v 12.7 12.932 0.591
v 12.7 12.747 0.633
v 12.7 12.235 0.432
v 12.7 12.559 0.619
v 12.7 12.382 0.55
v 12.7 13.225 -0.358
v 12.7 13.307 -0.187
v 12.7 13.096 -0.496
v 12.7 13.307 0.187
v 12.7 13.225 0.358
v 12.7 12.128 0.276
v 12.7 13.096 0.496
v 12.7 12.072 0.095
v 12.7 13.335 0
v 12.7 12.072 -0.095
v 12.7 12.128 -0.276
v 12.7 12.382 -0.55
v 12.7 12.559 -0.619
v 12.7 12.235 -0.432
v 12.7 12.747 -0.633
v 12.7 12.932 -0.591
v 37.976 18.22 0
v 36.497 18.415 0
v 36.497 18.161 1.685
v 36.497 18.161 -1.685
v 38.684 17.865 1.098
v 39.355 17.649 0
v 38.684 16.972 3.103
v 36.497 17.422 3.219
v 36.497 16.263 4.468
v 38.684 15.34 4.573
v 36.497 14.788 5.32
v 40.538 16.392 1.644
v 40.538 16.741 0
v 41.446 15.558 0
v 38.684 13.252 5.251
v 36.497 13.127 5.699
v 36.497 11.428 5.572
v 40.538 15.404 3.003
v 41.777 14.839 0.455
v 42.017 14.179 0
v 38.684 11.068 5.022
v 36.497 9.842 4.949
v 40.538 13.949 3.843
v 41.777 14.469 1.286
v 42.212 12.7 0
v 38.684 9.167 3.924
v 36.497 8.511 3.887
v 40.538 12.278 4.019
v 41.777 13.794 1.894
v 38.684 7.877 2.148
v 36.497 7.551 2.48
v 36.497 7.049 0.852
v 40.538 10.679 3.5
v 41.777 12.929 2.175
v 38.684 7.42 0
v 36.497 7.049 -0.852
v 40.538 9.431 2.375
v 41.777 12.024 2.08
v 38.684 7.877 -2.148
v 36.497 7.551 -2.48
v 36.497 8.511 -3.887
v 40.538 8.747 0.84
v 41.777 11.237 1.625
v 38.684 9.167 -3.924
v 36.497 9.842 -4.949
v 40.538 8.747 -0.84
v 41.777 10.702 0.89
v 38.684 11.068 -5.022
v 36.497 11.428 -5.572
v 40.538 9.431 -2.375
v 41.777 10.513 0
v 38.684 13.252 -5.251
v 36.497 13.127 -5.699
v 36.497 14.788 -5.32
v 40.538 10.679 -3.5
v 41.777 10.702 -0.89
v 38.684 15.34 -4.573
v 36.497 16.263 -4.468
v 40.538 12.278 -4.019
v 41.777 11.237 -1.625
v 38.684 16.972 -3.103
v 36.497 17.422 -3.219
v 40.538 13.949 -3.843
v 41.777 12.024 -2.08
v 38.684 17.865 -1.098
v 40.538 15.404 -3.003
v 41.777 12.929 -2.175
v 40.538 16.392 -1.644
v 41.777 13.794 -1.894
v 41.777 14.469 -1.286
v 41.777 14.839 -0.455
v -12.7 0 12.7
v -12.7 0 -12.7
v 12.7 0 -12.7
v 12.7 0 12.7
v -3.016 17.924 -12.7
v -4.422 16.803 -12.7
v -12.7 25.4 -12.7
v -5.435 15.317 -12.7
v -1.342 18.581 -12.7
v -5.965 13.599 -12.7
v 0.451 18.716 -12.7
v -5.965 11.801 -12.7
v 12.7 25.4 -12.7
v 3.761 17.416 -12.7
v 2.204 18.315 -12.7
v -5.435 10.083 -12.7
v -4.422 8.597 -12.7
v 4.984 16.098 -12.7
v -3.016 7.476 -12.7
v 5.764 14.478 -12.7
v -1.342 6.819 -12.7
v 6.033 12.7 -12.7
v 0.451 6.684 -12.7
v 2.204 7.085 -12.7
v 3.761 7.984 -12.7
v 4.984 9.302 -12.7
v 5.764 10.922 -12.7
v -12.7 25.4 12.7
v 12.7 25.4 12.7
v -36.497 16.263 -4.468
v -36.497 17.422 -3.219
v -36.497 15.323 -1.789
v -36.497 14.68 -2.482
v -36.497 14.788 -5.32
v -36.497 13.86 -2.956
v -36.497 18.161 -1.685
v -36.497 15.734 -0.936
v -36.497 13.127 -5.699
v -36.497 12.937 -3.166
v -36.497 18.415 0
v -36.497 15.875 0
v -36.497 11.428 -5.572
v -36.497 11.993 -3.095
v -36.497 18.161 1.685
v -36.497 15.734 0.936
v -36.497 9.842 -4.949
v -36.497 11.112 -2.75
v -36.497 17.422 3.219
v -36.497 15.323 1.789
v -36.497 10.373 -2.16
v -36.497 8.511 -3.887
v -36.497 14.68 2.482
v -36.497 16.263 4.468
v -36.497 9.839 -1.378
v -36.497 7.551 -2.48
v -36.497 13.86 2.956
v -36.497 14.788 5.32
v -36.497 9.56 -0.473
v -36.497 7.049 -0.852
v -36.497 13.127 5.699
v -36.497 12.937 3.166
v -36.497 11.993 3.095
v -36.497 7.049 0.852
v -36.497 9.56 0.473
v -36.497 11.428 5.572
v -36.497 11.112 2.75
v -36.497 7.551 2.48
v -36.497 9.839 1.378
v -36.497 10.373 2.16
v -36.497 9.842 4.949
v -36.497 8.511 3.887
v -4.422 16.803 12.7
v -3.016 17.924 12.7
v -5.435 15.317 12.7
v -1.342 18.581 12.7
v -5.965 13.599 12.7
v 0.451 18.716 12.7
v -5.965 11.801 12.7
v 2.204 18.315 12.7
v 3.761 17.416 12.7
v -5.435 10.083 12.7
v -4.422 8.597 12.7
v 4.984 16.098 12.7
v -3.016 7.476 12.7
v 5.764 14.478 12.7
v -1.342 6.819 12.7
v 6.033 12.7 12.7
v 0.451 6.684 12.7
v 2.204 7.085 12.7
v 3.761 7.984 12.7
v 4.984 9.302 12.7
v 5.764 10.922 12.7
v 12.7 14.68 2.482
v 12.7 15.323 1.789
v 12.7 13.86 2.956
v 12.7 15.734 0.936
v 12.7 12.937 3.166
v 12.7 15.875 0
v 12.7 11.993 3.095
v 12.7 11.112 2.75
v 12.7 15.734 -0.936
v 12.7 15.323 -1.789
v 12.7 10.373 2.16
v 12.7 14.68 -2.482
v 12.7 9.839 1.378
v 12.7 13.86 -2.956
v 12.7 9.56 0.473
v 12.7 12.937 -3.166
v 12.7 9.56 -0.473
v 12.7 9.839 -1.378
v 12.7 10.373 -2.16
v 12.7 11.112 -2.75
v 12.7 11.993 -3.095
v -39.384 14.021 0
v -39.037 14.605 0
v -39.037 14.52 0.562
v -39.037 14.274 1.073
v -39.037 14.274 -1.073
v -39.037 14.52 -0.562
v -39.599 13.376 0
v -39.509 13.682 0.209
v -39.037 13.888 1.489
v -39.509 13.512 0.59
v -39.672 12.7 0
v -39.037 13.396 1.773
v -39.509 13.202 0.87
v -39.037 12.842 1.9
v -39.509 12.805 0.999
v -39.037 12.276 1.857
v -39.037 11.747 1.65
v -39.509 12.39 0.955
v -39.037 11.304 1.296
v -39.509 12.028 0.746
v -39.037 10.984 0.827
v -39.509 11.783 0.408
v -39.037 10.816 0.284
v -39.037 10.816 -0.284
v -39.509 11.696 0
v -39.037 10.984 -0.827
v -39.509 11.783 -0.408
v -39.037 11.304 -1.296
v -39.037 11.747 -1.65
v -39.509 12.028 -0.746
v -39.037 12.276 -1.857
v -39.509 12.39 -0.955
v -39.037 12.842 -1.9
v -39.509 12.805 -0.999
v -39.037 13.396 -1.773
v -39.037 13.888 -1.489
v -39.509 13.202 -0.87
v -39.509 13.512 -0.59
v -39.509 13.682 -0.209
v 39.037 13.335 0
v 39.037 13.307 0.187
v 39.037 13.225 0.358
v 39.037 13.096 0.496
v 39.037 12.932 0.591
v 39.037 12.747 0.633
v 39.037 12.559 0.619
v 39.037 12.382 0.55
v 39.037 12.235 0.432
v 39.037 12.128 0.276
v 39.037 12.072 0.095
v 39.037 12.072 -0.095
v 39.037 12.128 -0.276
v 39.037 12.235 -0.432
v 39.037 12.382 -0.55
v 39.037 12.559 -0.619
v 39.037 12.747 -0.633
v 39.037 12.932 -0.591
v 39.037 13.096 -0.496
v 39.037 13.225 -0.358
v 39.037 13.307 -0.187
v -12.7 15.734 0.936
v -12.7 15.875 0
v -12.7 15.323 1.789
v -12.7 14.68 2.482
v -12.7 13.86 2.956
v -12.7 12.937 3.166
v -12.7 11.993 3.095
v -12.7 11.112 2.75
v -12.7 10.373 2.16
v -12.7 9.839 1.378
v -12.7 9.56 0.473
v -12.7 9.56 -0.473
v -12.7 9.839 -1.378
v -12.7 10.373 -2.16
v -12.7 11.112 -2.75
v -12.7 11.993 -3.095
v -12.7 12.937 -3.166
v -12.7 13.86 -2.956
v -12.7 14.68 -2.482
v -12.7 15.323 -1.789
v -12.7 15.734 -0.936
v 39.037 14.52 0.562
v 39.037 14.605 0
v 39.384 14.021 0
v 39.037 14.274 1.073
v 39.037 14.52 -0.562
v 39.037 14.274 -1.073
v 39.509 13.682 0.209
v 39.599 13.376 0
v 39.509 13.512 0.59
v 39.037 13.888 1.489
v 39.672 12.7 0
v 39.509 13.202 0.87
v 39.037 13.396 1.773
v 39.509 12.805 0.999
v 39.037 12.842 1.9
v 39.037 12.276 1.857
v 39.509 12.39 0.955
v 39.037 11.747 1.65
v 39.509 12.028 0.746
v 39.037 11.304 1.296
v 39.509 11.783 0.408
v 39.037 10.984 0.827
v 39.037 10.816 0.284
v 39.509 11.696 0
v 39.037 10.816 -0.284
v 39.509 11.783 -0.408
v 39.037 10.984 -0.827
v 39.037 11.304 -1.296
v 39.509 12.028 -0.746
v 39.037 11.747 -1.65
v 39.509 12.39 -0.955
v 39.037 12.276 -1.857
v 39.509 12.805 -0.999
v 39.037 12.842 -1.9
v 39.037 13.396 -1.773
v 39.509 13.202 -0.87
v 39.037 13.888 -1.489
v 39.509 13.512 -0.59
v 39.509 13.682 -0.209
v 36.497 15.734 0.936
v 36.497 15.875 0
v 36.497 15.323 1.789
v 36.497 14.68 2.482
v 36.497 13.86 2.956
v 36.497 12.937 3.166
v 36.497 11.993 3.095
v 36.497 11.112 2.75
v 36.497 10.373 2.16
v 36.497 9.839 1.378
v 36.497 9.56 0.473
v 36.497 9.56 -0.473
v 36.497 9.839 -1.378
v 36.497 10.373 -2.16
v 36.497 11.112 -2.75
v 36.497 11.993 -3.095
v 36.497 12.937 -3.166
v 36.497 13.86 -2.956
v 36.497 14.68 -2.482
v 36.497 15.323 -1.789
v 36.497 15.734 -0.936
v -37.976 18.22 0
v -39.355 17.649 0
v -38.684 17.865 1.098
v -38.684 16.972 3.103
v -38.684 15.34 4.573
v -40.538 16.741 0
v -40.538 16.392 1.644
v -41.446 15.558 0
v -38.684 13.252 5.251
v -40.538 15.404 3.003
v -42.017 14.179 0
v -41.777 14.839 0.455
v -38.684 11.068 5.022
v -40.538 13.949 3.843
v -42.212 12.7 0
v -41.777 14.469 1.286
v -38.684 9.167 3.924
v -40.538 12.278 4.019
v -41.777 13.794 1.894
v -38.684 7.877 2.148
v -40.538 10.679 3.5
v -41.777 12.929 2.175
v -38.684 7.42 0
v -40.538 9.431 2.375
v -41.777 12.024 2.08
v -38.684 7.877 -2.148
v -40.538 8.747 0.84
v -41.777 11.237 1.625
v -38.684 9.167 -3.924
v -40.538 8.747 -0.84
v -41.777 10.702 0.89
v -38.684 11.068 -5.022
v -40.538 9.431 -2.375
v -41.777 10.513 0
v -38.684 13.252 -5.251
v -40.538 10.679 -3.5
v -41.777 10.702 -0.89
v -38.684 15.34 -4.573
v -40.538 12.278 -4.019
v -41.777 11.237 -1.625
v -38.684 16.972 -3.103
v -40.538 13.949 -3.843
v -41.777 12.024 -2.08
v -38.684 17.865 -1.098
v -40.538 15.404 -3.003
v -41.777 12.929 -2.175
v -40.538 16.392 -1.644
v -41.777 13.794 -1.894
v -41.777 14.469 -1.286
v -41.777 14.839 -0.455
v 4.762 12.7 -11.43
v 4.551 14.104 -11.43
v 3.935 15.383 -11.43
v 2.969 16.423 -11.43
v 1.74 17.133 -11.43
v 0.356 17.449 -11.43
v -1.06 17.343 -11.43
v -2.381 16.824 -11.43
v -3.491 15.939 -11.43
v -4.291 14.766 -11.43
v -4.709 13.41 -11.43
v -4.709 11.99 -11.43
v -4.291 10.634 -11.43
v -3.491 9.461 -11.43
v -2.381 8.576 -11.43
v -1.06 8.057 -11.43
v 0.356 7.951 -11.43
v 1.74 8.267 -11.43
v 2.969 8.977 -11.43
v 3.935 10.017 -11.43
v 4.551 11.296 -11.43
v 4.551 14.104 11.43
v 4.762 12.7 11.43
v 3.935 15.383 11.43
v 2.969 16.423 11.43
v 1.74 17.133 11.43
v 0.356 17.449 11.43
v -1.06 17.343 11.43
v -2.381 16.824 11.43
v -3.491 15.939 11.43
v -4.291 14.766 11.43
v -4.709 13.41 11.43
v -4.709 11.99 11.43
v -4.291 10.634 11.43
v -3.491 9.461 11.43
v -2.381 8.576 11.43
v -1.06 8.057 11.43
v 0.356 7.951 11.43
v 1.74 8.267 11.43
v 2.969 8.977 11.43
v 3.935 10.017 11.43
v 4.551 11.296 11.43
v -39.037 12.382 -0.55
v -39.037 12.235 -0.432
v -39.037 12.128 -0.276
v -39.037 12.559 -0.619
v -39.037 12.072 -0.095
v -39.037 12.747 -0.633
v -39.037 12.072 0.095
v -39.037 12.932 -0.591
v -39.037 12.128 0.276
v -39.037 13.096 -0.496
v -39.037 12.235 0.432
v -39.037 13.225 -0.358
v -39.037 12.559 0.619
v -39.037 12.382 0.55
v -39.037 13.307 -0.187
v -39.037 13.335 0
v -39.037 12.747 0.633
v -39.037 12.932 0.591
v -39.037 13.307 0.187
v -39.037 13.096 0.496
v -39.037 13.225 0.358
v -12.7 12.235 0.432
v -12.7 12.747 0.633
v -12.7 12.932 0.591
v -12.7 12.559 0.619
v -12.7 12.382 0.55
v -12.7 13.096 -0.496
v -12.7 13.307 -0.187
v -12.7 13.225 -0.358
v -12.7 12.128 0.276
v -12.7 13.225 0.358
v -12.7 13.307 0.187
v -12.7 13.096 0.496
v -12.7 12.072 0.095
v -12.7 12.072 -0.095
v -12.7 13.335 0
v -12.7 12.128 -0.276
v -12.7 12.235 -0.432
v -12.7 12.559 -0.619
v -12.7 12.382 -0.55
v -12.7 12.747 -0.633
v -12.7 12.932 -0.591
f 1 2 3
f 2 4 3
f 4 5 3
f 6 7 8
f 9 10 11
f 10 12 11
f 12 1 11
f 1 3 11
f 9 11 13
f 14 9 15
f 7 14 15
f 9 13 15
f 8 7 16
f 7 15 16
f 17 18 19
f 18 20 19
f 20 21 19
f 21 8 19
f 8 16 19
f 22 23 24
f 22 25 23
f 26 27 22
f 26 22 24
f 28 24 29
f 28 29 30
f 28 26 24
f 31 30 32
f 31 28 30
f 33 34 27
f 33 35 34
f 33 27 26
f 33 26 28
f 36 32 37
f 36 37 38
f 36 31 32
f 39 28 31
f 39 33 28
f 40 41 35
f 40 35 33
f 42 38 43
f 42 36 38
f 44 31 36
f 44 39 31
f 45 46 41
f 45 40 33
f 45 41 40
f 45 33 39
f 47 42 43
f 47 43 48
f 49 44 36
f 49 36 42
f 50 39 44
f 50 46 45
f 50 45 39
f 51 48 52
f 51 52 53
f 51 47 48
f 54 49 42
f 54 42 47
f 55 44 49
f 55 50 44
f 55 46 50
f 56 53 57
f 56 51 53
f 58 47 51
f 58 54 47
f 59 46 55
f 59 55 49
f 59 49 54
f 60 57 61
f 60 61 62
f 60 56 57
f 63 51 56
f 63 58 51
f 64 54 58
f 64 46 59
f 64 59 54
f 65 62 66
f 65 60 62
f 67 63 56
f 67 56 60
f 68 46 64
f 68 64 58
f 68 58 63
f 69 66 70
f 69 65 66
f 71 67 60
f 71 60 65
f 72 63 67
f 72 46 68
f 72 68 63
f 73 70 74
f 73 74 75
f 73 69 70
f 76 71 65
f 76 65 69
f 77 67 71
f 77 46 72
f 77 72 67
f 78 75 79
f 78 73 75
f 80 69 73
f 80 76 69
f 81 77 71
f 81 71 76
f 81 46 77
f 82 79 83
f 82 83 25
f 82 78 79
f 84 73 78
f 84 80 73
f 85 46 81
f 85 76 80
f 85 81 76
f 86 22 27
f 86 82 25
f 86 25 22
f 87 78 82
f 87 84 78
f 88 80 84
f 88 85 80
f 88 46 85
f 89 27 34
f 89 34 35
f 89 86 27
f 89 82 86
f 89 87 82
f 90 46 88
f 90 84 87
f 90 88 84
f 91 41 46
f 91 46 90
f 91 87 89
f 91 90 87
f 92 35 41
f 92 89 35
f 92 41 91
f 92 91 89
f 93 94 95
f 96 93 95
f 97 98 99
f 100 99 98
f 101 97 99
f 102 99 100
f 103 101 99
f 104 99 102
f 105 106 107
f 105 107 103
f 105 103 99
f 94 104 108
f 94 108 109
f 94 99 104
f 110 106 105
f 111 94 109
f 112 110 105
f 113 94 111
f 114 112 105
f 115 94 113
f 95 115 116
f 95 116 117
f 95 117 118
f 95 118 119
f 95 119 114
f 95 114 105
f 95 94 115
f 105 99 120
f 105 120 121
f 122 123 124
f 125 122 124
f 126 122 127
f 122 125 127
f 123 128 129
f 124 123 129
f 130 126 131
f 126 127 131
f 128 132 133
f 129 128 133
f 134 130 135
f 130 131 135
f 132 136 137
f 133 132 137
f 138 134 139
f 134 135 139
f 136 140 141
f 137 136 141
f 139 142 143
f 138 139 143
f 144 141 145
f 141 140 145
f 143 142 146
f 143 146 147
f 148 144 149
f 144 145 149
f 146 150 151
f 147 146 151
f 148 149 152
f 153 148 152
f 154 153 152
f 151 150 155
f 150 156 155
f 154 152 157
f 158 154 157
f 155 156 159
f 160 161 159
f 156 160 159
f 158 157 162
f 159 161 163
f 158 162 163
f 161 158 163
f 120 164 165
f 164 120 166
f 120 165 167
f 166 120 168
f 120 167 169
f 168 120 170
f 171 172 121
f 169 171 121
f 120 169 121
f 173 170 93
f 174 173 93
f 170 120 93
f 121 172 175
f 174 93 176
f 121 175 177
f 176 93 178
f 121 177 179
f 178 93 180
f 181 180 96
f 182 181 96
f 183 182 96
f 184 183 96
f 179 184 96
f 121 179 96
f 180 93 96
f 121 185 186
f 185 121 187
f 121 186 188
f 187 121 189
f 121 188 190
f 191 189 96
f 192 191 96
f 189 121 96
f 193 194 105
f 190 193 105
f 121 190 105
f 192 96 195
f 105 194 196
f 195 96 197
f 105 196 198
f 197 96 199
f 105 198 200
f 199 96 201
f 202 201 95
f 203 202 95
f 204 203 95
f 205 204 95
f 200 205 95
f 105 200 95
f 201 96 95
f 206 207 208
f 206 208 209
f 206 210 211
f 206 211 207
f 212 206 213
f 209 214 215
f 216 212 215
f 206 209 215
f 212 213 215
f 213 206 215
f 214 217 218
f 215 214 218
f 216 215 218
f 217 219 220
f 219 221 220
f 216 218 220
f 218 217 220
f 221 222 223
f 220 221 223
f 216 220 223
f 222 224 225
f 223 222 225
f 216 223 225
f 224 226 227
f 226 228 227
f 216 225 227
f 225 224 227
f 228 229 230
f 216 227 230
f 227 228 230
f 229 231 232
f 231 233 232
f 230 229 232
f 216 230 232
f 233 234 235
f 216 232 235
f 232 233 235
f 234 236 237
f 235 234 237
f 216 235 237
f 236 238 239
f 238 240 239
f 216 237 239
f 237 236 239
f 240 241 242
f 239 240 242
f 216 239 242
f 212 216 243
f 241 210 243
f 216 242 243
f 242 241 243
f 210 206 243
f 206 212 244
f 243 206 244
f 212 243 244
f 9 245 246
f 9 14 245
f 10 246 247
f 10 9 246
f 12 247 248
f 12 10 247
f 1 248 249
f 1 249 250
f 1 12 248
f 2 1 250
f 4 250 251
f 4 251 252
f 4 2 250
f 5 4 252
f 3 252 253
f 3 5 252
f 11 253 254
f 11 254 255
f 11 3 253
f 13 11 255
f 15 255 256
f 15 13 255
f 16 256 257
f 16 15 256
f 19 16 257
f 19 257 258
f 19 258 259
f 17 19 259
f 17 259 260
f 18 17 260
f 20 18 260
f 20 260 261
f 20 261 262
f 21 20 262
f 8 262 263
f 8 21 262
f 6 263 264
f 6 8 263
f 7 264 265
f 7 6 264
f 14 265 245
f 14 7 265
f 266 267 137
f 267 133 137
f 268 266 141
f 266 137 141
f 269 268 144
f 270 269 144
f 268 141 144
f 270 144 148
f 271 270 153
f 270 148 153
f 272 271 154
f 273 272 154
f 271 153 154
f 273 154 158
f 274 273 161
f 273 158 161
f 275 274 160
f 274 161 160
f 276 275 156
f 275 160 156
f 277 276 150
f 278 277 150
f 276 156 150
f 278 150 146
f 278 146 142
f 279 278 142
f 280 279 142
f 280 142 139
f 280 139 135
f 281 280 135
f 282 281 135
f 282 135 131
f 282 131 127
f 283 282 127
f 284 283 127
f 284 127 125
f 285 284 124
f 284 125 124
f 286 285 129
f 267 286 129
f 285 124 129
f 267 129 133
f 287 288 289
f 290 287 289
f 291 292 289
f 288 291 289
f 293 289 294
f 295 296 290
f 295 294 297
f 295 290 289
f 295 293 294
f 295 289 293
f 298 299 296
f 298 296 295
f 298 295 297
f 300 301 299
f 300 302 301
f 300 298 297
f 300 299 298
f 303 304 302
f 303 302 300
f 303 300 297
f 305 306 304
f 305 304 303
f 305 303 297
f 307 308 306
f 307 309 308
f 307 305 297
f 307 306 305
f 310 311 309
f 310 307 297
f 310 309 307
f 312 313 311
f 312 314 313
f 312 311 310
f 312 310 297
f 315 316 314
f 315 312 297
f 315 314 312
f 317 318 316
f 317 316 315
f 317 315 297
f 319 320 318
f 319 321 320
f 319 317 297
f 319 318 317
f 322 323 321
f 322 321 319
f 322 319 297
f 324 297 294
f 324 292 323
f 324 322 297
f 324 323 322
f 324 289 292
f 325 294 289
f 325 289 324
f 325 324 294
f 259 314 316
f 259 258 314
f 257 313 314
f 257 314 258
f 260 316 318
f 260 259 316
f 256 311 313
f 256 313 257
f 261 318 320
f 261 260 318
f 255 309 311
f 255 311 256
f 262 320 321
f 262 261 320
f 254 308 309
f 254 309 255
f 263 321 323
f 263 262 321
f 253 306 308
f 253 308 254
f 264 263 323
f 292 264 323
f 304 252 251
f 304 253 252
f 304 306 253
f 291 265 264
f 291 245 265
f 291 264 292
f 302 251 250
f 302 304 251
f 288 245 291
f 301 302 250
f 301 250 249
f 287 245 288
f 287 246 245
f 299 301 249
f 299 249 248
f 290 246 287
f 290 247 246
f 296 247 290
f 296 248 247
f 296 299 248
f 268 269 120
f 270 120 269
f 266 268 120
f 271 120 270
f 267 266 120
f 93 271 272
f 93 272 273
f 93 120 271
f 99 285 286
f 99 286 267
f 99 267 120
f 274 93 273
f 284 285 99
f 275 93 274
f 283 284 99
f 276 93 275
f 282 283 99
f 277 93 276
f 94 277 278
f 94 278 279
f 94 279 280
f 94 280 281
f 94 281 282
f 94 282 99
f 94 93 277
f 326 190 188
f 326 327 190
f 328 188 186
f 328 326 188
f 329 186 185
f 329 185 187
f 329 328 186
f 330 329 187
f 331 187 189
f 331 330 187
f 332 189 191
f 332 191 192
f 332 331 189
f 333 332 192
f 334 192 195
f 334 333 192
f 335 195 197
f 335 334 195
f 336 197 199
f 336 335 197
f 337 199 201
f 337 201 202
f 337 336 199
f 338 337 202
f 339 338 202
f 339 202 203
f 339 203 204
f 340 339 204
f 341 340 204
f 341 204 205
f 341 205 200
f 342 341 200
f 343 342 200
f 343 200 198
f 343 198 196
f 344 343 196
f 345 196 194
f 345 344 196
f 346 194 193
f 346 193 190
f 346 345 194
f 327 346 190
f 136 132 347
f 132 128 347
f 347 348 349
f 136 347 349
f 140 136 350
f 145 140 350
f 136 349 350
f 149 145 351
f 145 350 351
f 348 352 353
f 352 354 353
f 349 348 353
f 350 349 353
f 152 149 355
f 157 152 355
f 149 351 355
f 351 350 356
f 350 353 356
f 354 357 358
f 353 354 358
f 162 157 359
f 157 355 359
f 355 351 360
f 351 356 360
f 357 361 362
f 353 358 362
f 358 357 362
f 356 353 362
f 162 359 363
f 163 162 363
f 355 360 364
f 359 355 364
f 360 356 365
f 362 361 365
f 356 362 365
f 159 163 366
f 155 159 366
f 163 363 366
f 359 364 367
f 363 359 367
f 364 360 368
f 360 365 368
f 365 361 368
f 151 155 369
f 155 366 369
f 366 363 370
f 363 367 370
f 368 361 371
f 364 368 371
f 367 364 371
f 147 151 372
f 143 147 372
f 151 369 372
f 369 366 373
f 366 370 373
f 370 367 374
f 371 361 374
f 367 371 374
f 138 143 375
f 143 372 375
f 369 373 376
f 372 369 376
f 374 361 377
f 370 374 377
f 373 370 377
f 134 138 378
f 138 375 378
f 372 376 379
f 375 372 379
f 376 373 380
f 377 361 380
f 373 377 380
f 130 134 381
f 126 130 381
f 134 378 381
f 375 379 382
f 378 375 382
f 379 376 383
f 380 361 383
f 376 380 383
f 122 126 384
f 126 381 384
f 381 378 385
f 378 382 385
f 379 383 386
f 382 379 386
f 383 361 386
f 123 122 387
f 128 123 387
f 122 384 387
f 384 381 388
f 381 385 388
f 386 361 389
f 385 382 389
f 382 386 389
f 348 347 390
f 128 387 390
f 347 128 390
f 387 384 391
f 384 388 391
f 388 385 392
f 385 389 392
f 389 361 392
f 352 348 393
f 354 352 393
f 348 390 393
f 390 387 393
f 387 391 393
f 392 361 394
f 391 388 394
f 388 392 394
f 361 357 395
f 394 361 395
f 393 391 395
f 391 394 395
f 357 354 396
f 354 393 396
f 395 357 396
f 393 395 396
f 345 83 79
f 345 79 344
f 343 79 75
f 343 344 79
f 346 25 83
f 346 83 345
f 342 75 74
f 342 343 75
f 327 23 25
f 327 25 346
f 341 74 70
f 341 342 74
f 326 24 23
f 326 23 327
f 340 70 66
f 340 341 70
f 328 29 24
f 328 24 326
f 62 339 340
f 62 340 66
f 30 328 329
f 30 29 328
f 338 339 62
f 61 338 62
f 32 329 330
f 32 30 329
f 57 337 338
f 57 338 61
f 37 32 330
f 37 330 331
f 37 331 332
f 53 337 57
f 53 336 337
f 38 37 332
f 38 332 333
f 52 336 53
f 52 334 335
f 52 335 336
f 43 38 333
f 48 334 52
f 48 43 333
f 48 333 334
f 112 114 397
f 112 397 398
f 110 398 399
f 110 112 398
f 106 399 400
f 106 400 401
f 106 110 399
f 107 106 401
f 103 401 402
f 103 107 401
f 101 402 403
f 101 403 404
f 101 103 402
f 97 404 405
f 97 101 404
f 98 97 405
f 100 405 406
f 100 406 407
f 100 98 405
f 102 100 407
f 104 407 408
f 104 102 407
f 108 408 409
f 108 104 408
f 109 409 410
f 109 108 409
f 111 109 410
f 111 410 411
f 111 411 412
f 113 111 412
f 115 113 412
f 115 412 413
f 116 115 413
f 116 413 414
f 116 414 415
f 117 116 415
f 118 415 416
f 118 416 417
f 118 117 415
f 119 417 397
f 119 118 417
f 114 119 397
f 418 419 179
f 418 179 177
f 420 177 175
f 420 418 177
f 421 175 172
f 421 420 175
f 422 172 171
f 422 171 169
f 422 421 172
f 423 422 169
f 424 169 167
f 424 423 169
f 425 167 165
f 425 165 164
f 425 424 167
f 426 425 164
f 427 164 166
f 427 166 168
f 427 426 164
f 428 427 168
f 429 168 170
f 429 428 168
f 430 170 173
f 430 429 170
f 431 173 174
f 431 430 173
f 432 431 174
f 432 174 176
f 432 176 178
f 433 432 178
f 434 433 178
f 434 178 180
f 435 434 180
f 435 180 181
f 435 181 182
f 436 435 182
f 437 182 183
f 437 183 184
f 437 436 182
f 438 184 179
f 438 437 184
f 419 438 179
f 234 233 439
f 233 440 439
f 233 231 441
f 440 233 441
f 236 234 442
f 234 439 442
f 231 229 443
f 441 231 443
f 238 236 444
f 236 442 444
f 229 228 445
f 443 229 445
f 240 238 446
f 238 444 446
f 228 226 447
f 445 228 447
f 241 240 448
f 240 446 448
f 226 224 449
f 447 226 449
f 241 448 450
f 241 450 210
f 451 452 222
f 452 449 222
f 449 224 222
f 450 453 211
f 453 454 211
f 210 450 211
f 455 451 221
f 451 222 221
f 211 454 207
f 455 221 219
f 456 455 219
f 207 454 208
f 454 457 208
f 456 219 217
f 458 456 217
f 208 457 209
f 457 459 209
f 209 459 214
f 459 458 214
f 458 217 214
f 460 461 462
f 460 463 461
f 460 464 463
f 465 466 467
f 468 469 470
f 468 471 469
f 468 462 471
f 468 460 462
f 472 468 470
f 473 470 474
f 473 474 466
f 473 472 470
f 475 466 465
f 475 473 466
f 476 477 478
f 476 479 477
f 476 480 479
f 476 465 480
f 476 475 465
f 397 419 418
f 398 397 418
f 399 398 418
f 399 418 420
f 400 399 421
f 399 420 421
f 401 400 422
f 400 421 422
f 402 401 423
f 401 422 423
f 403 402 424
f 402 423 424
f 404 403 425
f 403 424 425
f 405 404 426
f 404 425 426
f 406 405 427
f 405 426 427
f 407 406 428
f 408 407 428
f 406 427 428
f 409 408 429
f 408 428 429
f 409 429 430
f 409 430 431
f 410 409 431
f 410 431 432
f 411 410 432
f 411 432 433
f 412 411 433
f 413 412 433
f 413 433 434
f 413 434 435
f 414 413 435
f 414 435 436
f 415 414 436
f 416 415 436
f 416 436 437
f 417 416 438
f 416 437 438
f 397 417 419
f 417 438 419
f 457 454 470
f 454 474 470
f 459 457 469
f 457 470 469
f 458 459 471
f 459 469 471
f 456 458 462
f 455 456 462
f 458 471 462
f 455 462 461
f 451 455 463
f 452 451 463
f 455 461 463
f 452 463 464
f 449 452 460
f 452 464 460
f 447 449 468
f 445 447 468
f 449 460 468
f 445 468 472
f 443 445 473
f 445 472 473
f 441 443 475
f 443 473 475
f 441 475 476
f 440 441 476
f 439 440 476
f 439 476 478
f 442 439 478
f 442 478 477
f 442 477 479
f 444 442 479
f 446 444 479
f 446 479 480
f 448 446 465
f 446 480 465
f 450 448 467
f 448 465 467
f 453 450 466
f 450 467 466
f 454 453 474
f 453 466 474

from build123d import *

# Parameters (mm, degrees)
SKETCH1_W           = 25.4
SKETCH1_H           = 25.4
BOSS_EXTRUDE1_DEPTH = 25.4
SKETCH2_R           = 4.7625
CUT_EXTRUDE1_DEPTH  = 25.4
CHAMFER1_SIZE       = 1.27
CHAMFER2_SIZE       = 1.27


with BuildPart() as part:
    # Sketch1 → Boss-Extrude1 (new body)
    with BuildSketch(Plane(origin=(0, 0, 0), x_dir=(1, 0, 0), z_dir=(0, 1, 0))):
        Rectangle(SKETCH1_W, SKETCH1_H)
    extrude(amount=BOSS_EXTRUDE1_DEPTH)

    # Sketch2 → Cut-Extrude1 (cut)
    with BuildSketch(Plane.XY.offset(12.7)):
        with Locations((0, 12.7)):
            Circle(SKETCH2_R)
    extrude(amount=-CUT_EXTRUDE1_DEPTH, mode=Mode.SUBTRACT)

    # Chamfer1
    chamfer1_edges = [part.edges().sort_by_distance(p)[0] for p in [
        (-4.7625, 12.7, 12.7),
    ]]
    chamfer(chamfer1_edges, length=CHAMFER1_SIZE)

    # Chamfer2
    chamfer2_edges = [part.edges().sort_by_distance(p)[0] for p in [
        (-4.7625, 12.7, -12.7),
    ]]
    chamfer(chamfer2_edges, length=CHAMFER2_SIZE)

    # Sketch5 → Revolve-Thin4 (revolve)
    with BuildSketch(Plane.XY):
        with BuildLine():
            Line((12.7, 15.875), (36.497053043, 15.875))
            Line((36.497053043, 15.875), (36.497053043, 18.415))
            ThreePointArc((36.497053043, 18.415), (40.538168298, 16.741115254), (42.212053043, 12.7))
            Line((42.212053043, 12.7), (39.672053043, 12.7))
            ThreePointArc((39.672053043, 12.7), (39.509122515, 13.704023157), (39.037053043, 14.605))
            Line((39.037053043, 14.605), (39.037053043, 13.335))
            Line((39.037053043, 13.335), (12.7, 13.335))
            Line((12.7, 13.335), (12.7, 15.875))
        make_face()
    revolve_thin4 = revolve(axis=Axis((12.7, 12.7, 0), (1, 0, 0)))

    # Mirror1: Revolve-Thin4 across plane
    add(revolve_thin4.mirror(Plane.ZY))


solid = part.part
